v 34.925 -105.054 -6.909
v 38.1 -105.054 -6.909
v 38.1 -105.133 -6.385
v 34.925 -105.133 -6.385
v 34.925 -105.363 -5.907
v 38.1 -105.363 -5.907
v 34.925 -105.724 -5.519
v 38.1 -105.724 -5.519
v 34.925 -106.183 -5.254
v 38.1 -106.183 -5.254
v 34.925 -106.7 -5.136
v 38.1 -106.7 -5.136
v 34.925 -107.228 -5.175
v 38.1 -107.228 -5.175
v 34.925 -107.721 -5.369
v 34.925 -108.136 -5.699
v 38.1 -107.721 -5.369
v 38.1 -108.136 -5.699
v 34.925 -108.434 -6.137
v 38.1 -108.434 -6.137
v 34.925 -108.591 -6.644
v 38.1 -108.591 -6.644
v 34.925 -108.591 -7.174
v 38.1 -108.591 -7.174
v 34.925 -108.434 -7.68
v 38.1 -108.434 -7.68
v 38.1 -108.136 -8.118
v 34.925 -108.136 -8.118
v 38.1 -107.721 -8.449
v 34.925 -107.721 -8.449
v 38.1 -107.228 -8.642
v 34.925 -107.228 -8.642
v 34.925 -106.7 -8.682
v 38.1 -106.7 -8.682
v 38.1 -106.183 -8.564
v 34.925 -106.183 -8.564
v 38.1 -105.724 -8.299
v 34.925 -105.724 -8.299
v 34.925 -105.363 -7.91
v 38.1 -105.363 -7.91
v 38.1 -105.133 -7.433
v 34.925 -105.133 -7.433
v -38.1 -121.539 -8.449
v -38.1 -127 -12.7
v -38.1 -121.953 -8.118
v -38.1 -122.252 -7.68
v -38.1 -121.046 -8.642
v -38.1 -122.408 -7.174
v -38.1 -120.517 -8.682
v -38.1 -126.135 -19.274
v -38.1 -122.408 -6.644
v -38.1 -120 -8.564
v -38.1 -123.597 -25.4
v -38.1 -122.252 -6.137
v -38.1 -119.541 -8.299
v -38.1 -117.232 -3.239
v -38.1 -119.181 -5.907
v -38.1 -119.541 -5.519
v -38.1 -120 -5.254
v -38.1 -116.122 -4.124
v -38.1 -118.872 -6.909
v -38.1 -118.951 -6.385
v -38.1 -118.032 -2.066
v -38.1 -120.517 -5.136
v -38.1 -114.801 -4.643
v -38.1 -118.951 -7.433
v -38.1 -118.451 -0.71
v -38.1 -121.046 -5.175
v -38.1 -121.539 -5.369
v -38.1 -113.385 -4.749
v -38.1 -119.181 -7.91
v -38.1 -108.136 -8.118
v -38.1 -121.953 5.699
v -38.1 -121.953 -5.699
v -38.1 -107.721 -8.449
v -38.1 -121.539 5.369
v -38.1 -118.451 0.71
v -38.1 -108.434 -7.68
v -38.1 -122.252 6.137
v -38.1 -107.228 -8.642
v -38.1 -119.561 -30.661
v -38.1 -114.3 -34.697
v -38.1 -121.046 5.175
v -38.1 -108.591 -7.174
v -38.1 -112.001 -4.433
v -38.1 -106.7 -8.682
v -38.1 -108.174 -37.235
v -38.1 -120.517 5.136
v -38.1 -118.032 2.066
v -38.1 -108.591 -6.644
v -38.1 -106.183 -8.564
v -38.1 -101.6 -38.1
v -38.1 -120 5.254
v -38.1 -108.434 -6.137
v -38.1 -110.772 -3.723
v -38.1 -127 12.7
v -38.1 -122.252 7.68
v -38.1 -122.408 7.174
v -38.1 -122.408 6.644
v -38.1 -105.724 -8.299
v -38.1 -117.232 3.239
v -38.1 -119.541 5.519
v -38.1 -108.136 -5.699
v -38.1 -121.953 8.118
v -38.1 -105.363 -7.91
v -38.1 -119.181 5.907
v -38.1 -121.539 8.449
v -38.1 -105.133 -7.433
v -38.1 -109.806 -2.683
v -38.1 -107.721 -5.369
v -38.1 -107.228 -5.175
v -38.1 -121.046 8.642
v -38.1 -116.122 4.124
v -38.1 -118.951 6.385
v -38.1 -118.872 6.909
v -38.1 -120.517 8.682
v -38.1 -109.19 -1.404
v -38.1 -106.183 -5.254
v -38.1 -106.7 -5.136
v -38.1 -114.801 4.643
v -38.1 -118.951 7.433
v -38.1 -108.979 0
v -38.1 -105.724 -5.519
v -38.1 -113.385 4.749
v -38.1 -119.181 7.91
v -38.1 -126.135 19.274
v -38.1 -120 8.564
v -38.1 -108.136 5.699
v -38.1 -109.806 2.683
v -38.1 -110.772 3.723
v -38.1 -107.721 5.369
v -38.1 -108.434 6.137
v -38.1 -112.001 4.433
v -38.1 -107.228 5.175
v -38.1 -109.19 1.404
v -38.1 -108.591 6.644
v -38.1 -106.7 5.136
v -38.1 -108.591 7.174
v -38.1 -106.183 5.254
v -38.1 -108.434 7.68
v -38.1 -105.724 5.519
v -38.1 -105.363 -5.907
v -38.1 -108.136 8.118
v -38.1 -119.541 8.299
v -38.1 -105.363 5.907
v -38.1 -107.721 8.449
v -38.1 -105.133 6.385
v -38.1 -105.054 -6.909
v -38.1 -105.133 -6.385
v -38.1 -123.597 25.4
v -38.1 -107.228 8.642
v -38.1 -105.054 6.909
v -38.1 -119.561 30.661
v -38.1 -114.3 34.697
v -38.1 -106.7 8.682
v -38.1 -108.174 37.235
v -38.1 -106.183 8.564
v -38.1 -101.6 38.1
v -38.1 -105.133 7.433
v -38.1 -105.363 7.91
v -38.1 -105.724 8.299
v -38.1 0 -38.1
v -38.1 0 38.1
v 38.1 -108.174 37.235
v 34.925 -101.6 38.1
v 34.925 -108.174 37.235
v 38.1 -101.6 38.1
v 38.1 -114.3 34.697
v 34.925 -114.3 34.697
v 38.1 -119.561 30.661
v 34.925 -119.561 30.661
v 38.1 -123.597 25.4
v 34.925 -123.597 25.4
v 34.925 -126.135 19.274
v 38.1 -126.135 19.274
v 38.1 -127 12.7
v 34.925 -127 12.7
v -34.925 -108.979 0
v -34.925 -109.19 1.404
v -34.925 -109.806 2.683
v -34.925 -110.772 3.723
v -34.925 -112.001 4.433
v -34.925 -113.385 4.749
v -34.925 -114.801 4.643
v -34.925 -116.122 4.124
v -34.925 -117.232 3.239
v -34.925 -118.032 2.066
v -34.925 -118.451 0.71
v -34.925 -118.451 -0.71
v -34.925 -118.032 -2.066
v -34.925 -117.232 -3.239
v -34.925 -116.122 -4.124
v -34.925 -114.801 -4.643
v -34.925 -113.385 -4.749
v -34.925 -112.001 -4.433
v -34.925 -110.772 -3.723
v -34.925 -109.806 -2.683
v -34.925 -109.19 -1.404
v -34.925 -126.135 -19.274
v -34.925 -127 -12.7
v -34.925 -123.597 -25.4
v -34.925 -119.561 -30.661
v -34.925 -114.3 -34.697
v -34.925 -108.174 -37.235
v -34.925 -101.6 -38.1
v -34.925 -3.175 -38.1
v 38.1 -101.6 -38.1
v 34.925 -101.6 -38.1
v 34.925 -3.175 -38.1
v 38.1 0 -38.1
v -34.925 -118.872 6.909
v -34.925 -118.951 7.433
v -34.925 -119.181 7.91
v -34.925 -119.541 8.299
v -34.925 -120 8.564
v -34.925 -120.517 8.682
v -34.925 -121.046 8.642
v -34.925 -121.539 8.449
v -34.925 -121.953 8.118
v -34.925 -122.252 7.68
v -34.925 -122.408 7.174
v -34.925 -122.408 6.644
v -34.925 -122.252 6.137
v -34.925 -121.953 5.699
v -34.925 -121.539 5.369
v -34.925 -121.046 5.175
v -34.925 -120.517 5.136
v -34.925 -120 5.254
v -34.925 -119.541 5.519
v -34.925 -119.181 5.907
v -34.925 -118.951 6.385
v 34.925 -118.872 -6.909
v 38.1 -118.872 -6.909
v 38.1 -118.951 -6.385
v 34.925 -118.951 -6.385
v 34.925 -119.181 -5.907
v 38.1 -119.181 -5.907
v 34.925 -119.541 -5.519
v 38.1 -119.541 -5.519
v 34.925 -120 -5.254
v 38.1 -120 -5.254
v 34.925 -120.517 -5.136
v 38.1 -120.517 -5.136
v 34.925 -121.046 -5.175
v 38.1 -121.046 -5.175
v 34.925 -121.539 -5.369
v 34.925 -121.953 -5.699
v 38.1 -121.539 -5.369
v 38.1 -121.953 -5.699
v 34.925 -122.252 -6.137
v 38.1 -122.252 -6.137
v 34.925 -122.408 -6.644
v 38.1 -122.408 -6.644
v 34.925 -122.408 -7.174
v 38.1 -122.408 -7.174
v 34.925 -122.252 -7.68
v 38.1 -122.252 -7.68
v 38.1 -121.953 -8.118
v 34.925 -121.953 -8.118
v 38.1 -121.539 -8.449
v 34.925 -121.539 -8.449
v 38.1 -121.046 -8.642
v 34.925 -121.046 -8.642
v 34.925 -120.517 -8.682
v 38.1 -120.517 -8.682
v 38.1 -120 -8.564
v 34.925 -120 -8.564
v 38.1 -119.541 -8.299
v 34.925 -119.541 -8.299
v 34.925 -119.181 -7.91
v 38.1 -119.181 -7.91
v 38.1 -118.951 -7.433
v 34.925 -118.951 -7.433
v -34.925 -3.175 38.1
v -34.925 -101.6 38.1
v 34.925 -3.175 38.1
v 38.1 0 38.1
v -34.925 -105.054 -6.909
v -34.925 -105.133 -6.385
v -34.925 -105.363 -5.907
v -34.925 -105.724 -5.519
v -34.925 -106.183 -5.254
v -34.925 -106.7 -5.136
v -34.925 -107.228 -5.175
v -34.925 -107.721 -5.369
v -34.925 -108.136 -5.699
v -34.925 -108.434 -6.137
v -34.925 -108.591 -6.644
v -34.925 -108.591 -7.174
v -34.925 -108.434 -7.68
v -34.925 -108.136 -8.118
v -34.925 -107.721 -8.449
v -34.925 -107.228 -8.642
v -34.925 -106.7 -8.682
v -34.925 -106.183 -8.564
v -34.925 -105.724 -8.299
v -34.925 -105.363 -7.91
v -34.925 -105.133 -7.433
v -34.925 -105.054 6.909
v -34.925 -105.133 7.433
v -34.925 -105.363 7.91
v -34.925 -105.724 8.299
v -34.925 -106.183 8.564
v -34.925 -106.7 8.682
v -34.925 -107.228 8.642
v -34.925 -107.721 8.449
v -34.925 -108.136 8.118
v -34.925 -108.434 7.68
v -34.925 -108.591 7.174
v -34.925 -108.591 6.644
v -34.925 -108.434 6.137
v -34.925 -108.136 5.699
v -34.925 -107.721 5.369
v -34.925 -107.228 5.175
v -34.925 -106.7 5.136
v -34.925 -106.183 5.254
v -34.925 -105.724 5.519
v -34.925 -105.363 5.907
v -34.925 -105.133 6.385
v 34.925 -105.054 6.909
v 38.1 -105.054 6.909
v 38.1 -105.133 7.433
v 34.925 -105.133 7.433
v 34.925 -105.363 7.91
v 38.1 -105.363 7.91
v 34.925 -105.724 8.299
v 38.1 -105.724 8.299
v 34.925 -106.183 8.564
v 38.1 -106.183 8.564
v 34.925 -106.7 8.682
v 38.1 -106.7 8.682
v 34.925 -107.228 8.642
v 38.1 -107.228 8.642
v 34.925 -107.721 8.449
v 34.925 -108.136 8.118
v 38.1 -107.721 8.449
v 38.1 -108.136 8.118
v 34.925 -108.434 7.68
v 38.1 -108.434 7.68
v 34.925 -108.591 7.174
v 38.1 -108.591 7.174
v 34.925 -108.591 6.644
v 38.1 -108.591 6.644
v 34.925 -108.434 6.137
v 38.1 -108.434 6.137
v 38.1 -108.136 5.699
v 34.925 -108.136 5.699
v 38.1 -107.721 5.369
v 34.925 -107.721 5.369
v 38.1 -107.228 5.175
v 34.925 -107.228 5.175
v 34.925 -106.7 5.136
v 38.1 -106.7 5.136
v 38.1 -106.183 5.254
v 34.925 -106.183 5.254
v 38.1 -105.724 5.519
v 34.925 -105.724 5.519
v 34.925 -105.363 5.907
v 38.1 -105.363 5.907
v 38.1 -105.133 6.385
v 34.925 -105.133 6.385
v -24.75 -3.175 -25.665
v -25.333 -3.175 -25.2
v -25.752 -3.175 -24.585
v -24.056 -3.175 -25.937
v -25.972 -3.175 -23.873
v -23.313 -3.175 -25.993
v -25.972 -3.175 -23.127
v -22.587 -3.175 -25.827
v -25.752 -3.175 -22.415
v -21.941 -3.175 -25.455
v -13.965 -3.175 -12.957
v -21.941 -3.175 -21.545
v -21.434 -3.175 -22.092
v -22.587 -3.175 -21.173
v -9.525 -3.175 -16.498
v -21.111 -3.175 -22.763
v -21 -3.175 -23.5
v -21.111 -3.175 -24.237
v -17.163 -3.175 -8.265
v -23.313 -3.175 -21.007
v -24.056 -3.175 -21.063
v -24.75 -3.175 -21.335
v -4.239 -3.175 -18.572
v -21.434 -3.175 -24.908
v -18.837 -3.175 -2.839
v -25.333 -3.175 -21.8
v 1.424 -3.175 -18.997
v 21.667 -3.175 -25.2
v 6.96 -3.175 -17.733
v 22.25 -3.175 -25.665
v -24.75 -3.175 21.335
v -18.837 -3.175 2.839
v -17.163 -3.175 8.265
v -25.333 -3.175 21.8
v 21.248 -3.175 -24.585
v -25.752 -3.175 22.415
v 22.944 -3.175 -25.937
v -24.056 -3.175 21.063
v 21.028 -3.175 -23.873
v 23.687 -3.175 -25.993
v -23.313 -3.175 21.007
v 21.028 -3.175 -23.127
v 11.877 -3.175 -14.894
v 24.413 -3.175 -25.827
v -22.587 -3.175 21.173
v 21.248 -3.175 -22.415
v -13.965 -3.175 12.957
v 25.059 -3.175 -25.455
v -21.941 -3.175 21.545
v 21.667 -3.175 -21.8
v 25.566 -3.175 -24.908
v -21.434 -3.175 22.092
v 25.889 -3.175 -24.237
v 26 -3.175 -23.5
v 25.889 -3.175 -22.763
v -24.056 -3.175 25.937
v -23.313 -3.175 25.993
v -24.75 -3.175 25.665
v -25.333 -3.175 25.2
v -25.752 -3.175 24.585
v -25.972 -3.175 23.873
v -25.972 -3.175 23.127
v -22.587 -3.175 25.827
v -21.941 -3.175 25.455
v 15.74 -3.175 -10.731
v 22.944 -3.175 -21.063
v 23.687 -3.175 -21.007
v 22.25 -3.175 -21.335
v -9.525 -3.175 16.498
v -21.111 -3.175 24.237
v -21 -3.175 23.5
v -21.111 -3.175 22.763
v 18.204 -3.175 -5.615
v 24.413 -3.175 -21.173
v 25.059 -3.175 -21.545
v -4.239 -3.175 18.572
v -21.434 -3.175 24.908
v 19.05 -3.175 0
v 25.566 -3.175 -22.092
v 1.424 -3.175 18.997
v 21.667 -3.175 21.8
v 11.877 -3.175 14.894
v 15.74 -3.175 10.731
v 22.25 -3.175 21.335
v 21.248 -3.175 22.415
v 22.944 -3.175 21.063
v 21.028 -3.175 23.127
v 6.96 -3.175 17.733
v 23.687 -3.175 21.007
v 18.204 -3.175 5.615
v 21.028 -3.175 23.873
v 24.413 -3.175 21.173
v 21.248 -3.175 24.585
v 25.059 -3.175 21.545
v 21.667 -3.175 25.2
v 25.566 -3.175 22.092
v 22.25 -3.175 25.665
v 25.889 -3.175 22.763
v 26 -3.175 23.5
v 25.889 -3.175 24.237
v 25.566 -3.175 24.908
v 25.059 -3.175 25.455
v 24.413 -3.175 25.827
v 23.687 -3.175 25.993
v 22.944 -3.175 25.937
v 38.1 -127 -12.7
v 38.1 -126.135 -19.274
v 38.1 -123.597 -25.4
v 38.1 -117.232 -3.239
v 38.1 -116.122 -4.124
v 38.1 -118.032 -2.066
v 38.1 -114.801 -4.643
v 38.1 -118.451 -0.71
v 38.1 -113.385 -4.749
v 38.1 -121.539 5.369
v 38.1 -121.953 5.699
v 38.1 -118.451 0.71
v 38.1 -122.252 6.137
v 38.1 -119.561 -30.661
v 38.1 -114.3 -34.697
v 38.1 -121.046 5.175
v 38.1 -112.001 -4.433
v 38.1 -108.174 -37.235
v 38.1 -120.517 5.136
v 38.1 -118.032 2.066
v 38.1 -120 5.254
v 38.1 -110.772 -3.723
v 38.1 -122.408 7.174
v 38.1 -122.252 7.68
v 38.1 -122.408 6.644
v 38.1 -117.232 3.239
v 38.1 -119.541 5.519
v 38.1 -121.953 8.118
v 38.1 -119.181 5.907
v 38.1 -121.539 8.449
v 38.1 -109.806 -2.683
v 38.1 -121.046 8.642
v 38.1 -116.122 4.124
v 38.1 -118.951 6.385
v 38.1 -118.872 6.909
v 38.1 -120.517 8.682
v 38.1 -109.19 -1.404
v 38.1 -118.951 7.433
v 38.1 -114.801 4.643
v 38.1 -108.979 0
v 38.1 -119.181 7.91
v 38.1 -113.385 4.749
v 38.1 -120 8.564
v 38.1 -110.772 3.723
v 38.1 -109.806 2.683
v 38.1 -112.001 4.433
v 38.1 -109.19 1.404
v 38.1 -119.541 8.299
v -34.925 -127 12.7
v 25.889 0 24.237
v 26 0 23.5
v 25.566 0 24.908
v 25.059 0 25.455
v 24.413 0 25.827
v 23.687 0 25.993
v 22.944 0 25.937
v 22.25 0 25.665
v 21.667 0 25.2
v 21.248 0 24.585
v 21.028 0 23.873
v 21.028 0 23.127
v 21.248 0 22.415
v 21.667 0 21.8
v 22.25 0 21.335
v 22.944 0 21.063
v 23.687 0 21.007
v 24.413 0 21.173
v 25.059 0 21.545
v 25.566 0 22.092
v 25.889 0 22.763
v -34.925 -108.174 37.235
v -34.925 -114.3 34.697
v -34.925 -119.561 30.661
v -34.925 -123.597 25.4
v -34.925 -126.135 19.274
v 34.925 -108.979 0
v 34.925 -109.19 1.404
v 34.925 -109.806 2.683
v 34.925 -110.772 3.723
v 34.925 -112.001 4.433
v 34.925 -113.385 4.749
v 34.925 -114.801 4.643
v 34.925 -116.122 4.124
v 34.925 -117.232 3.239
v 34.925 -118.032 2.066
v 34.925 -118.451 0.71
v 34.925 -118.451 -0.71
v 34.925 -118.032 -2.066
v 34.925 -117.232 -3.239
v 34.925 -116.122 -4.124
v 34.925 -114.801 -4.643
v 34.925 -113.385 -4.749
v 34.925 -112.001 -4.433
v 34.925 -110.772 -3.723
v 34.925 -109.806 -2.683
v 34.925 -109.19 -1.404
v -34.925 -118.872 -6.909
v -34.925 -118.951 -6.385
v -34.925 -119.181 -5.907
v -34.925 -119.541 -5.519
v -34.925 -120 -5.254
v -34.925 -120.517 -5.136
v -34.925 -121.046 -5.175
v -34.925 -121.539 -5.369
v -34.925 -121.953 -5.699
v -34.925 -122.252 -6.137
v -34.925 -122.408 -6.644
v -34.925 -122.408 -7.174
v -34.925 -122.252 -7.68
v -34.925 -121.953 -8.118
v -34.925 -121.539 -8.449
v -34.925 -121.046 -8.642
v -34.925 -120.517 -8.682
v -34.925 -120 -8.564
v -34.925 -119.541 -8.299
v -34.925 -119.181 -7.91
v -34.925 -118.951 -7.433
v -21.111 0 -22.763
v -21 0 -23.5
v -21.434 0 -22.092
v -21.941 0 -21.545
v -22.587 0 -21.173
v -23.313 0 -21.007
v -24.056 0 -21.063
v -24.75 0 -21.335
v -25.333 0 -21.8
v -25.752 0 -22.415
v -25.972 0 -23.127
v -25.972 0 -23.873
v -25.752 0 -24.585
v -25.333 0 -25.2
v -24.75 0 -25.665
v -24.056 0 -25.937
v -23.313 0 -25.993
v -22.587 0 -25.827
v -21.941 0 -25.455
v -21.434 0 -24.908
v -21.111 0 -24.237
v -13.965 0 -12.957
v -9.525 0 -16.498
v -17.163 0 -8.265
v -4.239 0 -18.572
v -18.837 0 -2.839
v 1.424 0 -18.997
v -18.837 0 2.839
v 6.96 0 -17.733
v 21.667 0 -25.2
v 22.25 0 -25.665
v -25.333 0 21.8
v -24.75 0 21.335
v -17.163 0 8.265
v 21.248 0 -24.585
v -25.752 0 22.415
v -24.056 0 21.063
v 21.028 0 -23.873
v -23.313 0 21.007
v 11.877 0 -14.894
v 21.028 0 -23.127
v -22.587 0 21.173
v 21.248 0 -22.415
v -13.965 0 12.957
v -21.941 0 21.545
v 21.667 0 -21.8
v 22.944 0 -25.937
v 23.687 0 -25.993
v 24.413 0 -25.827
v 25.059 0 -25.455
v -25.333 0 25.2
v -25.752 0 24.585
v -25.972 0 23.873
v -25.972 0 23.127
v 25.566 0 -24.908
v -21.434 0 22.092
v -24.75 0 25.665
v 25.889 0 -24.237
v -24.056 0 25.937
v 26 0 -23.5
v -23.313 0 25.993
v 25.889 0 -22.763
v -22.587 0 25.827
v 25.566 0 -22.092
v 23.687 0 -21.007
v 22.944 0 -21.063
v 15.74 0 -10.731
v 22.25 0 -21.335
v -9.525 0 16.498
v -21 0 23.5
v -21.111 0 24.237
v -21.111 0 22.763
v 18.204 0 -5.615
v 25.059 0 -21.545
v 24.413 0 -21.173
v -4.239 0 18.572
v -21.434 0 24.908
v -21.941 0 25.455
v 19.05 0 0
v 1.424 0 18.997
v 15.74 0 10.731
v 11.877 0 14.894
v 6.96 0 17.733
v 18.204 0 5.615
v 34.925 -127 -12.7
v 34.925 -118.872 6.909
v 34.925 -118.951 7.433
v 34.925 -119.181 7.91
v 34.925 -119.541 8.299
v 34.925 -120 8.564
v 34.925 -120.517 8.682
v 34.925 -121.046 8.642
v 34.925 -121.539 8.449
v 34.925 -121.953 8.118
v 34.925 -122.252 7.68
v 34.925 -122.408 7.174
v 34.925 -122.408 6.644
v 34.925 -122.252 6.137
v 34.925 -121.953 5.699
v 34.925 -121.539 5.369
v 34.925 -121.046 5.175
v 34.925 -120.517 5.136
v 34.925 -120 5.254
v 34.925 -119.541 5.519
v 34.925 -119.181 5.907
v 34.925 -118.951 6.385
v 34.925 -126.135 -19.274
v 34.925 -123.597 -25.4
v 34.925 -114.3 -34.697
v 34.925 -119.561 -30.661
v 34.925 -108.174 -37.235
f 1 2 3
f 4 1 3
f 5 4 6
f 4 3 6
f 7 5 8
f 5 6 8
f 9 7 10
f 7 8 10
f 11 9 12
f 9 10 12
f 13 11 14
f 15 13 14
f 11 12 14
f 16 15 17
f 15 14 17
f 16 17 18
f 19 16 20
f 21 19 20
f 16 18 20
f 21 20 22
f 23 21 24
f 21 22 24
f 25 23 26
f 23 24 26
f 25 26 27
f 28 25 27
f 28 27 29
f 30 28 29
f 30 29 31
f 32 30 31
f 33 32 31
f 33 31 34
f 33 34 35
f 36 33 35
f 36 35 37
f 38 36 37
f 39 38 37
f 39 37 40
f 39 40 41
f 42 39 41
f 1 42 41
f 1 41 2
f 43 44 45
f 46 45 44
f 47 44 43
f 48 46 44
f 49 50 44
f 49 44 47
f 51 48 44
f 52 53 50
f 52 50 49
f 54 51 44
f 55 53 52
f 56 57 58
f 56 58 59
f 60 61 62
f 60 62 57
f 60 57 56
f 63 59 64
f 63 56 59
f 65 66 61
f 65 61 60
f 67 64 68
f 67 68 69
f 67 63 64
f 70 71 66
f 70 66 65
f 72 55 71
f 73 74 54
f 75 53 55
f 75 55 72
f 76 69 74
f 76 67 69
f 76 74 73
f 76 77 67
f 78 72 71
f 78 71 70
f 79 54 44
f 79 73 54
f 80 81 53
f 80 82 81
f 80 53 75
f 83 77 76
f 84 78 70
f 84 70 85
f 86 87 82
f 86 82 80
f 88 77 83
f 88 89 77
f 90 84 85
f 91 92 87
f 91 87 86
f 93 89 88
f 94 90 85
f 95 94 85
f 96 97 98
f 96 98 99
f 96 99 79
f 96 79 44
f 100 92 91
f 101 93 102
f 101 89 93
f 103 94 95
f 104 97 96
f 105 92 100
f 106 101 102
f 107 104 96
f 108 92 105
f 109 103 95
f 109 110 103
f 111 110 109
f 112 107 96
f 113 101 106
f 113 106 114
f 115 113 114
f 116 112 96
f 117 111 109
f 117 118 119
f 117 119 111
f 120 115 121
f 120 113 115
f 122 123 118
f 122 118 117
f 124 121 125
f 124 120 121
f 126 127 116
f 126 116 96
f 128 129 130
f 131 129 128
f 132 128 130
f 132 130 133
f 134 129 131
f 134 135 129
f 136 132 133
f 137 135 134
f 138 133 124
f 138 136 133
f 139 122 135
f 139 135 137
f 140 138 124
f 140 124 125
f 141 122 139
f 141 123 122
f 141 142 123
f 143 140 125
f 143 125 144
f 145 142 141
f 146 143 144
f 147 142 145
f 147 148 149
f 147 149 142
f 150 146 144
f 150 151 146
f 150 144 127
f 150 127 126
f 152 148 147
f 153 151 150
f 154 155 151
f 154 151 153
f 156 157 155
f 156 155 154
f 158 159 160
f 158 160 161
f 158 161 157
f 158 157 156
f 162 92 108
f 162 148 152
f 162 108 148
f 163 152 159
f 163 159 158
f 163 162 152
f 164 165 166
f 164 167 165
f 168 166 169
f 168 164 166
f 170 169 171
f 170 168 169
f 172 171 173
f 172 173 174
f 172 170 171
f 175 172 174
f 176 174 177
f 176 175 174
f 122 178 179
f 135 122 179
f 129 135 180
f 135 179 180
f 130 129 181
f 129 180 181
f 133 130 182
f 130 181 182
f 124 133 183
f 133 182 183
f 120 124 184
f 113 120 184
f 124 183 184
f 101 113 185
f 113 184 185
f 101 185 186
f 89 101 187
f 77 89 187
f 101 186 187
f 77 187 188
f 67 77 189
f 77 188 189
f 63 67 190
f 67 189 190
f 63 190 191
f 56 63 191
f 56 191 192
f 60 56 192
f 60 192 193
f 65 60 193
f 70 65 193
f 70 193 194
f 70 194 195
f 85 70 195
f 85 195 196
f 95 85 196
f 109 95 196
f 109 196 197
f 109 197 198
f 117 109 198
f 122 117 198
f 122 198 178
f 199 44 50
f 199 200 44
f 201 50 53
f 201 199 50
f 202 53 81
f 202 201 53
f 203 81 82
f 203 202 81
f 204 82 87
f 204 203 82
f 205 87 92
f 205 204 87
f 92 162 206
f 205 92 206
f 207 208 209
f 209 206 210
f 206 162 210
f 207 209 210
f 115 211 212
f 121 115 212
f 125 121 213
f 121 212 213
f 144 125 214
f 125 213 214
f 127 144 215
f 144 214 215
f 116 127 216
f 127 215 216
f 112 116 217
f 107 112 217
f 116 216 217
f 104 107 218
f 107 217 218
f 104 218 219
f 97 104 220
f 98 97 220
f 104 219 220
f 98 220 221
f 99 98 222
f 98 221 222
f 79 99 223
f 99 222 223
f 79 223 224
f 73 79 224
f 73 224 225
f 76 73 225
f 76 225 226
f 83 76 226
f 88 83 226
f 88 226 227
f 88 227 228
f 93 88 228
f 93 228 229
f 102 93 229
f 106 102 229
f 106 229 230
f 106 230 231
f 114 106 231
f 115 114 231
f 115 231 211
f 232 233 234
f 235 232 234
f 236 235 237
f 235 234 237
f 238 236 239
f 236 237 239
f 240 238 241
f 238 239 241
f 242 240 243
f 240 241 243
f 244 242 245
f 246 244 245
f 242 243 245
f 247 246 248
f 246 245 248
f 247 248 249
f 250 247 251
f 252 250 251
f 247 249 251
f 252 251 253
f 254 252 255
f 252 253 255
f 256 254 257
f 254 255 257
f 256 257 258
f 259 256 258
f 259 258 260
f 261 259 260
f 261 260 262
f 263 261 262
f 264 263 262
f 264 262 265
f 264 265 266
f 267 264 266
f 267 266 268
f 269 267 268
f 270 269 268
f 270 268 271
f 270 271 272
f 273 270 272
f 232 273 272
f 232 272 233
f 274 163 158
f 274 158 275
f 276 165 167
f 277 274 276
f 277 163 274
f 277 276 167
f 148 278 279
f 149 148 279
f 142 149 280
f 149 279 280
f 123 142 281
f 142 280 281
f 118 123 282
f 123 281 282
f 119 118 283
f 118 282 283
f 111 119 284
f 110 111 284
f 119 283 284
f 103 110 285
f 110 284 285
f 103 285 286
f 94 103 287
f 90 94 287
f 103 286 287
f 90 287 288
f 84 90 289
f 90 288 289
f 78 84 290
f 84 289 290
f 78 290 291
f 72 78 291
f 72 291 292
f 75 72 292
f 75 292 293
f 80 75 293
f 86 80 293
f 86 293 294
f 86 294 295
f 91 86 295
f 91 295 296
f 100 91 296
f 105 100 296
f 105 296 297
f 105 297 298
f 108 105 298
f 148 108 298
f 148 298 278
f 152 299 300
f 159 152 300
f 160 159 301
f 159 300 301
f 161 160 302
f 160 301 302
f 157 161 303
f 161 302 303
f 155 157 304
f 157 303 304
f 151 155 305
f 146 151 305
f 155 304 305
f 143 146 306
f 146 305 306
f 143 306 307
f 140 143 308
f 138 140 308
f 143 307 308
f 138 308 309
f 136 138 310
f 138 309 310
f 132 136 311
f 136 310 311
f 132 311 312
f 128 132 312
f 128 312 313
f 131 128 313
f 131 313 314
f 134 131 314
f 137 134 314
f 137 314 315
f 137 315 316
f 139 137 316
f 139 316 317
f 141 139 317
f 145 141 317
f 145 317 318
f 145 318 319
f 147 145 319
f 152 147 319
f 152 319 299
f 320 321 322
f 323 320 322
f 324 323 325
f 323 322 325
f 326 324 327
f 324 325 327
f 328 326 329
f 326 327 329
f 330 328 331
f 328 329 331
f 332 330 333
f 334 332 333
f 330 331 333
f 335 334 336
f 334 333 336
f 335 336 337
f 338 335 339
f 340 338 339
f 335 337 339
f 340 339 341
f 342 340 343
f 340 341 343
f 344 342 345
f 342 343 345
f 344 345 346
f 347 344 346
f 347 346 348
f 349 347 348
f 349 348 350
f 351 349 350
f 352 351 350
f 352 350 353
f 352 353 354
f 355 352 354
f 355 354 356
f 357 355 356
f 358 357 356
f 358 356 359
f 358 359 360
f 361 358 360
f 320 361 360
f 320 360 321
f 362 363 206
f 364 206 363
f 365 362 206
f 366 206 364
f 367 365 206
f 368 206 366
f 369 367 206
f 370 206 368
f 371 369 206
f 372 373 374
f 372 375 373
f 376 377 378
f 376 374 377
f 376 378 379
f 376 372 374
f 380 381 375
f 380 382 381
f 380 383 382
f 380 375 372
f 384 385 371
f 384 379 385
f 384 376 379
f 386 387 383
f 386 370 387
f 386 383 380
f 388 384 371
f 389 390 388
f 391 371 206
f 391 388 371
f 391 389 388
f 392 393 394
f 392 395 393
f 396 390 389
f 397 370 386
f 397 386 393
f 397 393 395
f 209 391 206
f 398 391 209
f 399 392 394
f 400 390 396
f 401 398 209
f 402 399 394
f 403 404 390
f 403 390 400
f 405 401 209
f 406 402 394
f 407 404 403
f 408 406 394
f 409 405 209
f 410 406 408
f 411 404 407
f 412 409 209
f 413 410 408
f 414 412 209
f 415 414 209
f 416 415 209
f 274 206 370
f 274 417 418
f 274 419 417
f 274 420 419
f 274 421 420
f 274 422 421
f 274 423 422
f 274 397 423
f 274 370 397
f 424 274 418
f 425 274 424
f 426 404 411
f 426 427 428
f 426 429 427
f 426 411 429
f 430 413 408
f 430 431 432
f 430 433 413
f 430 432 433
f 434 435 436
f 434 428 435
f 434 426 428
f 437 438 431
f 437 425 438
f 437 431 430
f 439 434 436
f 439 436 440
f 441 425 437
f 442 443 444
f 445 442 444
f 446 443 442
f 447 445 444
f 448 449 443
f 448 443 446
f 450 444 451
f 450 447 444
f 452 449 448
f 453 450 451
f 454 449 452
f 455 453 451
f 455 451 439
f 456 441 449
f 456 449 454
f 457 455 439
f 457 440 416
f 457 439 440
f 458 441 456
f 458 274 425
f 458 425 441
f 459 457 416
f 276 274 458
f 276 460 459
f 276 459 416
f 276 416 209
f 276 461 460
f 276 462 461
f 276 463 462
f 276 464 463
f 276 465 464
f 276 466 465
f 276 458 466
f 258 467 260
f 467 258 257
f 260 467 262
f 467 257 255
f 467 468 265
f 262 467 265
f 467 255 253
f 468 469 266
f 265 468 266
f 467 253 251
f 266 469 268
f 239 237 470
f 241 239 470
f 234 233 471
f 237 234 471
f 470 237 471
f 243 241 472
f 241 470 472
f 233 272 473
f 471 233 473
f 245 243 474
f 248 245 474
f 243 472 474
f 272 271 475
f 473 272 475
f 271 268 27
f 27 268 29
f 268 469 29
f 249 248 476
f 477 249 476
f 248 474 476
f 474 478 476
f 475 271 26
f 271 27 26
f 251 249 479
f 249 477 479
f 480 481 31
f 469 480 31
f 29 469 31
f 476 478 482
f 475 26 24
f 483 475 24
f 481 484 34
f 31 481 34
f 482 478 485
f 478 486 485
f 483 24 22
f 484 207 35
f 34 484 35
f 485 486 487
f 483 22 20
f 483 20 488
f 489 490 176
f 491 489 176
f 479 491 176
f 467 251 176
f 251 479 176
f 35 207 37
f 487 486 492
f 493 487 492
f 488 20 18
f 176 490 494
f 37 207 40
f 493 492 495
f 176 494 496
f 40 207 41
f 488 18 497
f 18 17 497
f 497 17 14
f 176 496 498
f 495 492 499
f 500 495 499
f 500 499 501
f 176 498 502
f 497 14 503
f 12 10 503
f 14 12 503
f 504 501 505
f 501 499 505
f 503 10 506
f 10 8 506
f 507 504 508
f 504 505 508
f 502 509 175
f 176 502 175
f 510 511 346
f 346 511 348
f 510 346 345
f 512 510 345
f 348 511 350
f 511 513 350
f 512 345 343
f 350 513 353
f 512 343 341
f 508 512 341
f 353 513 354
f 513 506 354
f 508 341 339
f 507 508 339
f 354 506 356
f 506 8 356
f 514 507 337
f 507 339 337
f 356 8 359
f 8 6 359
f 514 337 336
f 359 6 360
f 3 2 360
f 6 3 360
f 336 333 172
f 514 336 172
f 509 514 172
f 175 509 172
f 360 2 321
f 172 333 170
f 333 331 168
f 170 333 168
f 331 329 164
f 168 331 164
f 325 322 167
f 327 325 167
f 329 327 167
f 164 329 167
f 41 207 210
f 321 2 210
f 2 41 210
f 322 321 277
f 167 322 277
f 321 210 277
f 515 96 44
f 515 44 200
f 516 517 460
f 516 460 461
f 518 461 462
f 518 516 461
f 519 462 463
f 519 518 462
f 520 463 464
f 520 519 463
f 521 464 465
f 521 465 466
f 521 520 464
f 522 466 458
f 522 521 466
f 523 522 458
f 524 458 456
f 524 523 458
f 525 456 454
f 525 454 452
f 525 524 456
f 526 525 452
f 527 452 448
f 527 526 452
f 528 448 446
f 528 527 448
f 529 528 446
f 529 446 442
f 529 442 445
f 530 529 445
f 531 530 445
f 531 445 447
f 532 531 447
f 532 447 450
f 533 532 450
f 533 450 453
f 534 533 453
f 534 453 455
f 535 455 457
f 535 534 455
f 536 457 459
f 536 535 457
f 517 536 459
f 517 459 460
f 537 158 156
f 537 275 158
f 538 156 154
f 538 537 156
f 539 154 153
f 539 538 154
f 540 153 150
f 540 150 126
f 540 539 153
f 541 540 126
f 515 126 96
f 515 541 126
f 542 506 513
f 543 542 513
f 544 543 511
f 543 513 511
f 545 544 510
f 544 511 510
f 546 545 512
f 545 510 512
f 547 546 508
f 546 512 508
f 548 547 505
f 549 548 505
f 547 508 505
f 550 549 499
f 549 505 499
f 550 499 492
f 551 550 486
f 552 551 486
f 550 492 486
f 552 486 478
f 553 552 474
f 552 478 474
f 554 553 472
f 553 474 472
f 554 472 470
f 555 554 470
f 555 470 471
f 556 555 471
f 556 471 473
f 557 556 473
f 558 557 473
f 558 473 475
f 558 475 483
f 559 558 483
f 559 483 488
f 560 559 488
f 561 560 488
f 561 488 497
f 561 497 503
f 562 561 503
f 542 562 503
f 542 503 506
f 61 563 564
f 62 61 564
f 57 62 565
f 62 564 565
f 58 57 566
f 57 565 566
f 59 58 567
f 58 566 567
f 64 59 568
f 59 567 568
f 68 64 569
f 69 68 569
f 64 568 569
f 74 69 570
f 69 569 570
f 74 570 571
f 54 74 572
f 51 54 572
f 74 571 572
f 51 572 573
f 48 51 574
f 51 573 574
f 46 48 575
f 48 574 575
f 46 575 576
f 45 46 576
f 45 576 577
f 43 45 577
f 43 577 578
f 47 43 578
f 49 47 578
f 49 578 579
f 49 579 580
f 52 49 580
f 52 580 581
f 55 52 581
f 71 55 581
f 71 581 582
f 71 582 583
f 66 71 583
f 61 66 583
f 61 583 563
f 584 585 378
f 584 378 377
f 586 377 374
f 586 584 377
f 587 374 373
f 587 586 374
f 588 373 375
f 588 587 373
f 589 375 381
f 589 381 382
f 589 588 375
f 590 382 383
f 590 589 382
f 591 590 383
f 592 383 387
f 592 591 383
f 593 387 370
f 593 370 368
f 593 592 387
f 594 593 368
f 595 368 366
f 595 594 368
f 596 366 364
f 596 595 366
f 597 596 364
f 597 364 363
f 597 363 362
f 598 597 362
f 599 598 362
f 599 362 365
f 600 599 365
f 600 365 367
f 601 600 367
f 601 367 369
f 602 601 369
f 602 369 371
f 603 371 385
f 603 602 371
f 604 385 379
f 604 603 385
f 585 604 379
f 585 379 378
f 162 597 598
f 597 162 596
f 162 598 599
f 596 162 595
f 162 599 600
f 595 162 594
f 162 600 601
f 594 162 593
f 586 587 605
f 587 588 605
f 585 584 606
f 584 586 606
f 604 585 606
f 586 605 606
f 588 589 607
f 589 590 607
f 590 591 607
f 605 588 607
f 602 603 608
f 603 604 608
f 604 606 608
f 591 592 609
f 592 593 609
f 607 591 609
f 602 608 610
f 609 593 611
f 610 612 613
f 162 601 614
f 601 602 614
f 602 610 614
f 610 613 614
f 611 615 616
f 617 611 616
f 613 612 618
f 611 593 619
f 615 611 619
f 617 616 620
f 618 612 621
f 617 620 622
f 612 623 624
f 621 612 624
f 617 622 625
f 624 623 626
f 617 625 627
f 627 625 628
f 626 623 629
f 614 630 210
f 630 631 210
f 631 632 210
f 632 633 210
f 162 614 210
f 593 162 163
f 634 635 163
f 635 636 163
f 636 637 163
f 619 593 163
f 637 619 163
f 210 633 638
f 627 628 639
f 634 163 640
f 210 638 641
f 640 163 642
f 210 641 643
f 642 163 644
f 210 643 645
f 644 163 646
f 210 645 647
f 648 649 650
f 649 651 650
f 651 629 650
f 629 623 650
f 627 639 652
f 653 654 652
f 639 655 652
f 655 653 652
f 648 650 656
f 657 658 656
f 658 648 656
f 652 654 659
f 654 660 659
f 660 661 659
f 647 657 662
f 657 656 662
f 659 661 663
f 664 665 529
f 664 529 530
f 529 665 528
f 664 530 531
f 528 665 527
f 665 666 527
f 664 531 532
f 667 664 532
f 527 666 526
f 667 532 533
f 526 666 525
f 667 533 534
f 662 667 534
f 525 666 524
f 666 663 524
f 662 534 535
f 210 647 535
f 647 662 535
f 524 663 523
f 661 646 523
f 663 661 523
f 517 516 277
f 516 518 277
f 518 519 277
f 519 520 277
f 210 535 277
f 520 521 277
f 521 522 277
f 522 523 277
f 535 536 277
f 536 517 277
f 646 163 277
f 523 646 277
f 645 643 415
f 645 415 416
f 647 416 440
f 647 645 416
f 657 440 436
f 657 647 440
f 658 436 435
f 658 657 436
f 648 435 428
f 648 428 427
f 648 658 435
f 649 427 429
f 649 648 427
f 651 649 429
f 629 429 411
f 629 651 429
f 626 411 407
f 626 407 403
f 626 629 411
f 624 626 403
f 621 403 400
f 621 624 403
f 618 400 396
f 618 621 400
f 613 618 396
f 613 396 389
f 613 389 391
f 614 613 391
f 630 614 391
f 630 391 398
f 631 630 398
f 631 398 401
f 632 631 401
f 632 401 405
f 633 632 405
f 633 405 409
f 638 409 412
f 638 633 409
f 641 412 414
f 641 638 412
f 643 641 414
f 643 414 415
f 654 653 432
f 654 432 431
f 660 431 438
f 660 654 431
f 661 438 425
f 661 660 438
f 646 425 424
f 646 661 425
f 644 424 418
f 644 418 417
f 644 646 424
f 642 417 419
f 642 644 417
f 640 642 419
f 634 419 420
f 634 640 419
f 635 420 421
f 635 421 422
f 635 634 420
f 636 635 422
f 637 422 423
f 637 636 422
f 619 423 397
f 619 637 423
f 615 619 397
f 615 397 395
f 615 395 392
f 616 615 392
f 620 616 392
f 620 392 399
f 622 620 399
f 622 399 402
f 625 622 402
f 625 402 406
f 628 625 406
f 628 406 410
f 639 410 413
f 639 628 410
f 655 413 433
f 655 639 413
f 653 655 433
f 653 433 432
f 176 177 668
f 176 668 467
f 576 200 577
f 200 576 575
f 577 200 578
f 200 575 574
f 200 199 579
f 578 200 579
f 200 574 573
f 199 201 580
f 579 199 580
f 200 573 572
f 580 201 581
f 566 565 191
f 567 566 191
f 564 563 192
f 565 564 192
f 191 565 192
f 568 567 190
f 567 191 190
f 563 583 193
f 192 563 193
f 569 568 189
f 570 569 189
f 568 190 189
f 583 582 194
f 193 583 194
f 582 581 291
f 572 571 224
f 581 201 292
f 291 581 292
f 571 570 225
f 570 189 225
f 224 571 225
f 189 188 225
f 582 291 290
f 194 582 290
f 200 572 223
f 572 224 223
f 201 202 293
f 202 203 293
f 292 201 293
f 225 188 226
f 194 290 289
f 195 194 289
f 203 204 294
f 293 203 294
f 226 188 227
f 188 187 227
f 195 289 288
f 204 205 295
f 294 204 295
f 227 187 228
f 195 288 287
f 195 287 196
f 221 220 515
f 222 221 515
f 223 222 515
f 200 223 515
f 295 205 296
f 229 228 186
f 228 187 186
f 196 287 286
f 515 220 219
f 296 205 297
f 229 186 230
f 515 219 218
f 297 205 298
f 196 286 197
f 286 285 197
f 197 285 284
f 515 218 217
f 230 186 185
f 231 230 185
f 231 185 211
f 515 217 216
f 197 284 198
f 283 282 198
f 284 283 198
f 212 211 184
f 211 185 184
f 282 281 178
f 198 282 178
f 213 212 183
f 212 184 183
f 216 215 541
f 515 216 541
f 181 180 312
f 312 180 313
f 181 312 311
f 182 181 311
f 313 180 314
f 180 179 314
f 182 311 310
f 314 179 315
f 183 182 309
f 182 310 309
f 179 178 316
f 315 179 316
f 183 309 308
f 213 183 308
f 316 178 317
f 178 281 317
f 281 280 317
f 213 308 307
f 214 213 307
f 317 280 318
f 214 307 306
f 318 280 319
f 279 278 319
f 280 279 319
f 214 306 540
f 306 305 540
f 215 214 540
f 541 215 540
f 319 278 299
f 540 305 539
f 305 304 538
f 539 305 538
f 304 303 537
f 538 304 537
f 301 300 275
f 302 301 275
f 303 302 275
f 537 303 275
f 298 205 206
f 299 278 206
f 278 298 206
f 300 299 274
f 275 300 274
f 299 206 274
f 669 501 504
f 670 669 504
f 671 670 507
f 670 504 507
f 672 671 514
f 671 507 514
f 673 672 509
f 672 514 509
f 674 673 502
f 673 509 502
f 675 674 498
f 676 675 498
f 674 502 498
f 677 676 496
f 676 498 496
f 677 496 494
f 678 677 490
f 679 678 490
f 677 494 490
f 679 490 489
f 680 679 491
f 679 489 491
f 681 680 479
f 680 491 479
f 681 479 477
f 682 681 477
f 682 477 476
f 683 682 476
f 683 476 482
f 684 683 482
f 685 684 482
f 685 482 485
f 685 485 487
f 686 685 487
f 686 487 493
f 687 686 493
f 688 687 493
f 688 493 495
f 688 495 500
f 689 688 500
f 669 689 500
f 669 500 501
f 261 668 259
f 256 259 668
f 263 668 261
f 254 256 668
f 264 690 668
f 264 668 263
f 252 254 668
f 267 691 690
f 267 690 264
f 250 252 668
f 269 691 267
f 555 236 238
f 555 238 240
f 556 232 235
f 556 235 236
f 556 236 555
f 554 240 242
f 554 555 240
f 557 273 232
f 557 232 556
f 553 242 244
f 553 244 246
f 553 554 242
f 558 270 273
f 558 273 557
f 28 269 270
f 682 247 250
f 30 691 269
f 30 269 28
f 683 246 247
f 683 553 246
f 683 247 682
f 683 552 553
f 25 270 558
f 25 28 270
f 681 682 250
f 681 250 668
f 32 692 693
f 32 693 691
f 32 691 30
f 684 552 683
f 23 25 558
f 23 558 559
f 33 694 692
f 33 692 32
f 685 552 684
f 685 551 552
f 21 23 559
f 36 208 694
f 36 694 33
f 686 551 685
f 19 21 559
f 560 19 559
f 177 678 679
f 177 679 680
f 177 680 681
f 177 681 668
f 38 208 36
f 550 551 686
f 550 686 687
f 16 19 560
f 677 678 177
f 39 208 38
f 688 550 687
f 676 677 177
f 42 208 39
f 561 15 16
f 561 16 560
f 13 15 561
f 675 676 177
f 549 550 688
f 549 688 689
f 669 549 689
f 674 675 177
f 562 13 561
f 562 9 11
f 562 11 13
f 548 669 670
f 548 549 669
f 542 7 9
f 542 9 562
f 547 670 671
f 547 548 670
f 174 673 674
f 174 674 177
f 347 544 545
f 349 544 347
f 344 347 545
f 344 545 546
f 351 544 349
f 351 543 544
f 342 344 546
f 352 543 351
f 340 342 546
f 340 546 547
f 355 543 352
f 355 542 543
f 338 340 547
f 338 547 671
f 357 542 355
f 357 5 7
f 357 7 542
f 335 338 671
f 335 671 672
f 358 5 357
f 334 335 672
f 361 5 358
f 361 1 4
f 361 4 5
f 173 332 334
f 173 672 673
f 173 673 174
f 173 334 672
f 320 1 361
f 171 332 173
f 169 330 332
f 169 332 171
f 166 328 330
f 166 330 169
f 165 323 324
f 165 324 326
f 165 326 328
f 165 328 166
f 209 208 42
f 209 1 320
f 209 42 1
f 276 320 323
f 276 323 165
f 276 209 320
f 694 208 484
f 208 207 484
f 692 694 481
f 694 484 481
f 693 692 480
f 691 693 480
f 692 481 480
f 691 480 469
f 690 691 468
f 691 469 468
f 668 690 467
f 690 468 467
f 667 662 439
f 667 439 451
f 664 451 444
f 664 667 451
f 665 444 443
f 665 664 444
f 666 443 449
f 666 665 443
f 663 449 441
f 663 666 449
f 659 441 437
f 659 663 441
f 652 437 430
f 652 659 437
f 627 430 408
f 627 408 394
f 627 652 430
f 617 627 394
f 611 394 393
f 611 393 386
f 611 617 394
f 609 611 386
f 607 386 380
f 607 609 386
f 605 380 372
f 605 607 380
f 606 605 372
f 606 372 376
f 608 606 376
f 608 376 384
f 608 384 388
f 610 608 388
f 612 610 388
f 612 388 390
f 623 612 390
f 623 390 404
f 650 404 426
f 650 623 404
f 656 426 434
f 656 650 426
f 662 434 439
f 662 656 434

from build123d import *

# Parameters (mm, degrees)
F0_W     = 69.85
F0_H     = 76.2
F0_R     = 2.5
F0_R_2   = 19.05
F1_DEPTH = 3.175
F0_W_2   = 3.175
F2_DEPTH = 127
F3_R     = 1.778
F3_R_2   = 4.7625
F4_DEPTH = 76.201
F5_R     = 25.4
F6_R     = 25.4
F7_R     = 25.4
F8_R     = 25.4


with BuildPart() as f1:
    # F0 (on Front) → F1 (new body)
    with BuildSketch(Plane.XZ):
        Rectangle(F0_W, F0_H)
        with Locations((-23.5, -23.5)):
            Circle(F0_R, mode=Mode.SUBTRACT)
        with Locations((23.5, -23.5)):
            Circle(F0_R, mode=Mode.SUBTRACT)
        with Locations((-23.5, 23.5)):
            Circle(F0_R, mode=Mode.SUBTRACT)
        Circle(F0_R_2, mode=Mode.SUBTRACT)
        with Locations((23.5, 23.5)):
            Circle(F0_R, mode=Mode.SUBTRACT)
    extrude(amount=F1_DEPTH)

    # F0 (on Front) → F2 (join)
    with BuildSketch(Plane.XZ):
        with Locations((-36.5125, 0)):
            Rectangle(F0_W_2, F0_H)
        with Locations((36.5125, 0)):
            Rectangle(F0_W_2, F0_H)
    extrude(amount=F2_DEPTH)

    # F3 (on face) → F4 (cut, through all)
    with BuildSketch(Plane.YZ.offset(38.1)):
        with Locations((-120.65, 6.9088)):
            Circle(F3_R)
        with Locations((-106.8324, 6.9088)):
            Circle(F3_R)
        with Locations((-106.8324, -6.9088)):
            Circle(F3_R)
        with Locations((-120.65, -6.9088)):
            Circle(F3_R)
        with Locations((-113.7412, 0)):
            Circle(F3_R_2)
    extrude(amount=-F4_DEPTH, mode=Mode.SUBTRACT)

    # F5
    f5_edges = [f1.edges().sort_by_distance(p)[0] for p in [
        (36.5125, -127, 38.1),
    ]]
    fillet(f5_edges, radius=F5_R)

    # F6
    f6_edges = [f1.edges().sort_by_distance(p)[0] for p in [
        (-36.5125, -127, 38.1),
    ]]
    fillet(f6_edges, radius=F6_R)

    # F7
    f7_edges = [f1.edges().sort_by_distance(p)[0] for p in [
        (-36.5125, -127, -38.1),
    ]]
    fillet(f7_edges, radius=F7_R)

    # F8
    f8_edges = [f1.edges().sort_by_distance(p)[0] for p in [
        (36.5125, -127, -38.1),
    ]]
    fillet(f8_edges, radius=F8_R)


solid = f1.part
